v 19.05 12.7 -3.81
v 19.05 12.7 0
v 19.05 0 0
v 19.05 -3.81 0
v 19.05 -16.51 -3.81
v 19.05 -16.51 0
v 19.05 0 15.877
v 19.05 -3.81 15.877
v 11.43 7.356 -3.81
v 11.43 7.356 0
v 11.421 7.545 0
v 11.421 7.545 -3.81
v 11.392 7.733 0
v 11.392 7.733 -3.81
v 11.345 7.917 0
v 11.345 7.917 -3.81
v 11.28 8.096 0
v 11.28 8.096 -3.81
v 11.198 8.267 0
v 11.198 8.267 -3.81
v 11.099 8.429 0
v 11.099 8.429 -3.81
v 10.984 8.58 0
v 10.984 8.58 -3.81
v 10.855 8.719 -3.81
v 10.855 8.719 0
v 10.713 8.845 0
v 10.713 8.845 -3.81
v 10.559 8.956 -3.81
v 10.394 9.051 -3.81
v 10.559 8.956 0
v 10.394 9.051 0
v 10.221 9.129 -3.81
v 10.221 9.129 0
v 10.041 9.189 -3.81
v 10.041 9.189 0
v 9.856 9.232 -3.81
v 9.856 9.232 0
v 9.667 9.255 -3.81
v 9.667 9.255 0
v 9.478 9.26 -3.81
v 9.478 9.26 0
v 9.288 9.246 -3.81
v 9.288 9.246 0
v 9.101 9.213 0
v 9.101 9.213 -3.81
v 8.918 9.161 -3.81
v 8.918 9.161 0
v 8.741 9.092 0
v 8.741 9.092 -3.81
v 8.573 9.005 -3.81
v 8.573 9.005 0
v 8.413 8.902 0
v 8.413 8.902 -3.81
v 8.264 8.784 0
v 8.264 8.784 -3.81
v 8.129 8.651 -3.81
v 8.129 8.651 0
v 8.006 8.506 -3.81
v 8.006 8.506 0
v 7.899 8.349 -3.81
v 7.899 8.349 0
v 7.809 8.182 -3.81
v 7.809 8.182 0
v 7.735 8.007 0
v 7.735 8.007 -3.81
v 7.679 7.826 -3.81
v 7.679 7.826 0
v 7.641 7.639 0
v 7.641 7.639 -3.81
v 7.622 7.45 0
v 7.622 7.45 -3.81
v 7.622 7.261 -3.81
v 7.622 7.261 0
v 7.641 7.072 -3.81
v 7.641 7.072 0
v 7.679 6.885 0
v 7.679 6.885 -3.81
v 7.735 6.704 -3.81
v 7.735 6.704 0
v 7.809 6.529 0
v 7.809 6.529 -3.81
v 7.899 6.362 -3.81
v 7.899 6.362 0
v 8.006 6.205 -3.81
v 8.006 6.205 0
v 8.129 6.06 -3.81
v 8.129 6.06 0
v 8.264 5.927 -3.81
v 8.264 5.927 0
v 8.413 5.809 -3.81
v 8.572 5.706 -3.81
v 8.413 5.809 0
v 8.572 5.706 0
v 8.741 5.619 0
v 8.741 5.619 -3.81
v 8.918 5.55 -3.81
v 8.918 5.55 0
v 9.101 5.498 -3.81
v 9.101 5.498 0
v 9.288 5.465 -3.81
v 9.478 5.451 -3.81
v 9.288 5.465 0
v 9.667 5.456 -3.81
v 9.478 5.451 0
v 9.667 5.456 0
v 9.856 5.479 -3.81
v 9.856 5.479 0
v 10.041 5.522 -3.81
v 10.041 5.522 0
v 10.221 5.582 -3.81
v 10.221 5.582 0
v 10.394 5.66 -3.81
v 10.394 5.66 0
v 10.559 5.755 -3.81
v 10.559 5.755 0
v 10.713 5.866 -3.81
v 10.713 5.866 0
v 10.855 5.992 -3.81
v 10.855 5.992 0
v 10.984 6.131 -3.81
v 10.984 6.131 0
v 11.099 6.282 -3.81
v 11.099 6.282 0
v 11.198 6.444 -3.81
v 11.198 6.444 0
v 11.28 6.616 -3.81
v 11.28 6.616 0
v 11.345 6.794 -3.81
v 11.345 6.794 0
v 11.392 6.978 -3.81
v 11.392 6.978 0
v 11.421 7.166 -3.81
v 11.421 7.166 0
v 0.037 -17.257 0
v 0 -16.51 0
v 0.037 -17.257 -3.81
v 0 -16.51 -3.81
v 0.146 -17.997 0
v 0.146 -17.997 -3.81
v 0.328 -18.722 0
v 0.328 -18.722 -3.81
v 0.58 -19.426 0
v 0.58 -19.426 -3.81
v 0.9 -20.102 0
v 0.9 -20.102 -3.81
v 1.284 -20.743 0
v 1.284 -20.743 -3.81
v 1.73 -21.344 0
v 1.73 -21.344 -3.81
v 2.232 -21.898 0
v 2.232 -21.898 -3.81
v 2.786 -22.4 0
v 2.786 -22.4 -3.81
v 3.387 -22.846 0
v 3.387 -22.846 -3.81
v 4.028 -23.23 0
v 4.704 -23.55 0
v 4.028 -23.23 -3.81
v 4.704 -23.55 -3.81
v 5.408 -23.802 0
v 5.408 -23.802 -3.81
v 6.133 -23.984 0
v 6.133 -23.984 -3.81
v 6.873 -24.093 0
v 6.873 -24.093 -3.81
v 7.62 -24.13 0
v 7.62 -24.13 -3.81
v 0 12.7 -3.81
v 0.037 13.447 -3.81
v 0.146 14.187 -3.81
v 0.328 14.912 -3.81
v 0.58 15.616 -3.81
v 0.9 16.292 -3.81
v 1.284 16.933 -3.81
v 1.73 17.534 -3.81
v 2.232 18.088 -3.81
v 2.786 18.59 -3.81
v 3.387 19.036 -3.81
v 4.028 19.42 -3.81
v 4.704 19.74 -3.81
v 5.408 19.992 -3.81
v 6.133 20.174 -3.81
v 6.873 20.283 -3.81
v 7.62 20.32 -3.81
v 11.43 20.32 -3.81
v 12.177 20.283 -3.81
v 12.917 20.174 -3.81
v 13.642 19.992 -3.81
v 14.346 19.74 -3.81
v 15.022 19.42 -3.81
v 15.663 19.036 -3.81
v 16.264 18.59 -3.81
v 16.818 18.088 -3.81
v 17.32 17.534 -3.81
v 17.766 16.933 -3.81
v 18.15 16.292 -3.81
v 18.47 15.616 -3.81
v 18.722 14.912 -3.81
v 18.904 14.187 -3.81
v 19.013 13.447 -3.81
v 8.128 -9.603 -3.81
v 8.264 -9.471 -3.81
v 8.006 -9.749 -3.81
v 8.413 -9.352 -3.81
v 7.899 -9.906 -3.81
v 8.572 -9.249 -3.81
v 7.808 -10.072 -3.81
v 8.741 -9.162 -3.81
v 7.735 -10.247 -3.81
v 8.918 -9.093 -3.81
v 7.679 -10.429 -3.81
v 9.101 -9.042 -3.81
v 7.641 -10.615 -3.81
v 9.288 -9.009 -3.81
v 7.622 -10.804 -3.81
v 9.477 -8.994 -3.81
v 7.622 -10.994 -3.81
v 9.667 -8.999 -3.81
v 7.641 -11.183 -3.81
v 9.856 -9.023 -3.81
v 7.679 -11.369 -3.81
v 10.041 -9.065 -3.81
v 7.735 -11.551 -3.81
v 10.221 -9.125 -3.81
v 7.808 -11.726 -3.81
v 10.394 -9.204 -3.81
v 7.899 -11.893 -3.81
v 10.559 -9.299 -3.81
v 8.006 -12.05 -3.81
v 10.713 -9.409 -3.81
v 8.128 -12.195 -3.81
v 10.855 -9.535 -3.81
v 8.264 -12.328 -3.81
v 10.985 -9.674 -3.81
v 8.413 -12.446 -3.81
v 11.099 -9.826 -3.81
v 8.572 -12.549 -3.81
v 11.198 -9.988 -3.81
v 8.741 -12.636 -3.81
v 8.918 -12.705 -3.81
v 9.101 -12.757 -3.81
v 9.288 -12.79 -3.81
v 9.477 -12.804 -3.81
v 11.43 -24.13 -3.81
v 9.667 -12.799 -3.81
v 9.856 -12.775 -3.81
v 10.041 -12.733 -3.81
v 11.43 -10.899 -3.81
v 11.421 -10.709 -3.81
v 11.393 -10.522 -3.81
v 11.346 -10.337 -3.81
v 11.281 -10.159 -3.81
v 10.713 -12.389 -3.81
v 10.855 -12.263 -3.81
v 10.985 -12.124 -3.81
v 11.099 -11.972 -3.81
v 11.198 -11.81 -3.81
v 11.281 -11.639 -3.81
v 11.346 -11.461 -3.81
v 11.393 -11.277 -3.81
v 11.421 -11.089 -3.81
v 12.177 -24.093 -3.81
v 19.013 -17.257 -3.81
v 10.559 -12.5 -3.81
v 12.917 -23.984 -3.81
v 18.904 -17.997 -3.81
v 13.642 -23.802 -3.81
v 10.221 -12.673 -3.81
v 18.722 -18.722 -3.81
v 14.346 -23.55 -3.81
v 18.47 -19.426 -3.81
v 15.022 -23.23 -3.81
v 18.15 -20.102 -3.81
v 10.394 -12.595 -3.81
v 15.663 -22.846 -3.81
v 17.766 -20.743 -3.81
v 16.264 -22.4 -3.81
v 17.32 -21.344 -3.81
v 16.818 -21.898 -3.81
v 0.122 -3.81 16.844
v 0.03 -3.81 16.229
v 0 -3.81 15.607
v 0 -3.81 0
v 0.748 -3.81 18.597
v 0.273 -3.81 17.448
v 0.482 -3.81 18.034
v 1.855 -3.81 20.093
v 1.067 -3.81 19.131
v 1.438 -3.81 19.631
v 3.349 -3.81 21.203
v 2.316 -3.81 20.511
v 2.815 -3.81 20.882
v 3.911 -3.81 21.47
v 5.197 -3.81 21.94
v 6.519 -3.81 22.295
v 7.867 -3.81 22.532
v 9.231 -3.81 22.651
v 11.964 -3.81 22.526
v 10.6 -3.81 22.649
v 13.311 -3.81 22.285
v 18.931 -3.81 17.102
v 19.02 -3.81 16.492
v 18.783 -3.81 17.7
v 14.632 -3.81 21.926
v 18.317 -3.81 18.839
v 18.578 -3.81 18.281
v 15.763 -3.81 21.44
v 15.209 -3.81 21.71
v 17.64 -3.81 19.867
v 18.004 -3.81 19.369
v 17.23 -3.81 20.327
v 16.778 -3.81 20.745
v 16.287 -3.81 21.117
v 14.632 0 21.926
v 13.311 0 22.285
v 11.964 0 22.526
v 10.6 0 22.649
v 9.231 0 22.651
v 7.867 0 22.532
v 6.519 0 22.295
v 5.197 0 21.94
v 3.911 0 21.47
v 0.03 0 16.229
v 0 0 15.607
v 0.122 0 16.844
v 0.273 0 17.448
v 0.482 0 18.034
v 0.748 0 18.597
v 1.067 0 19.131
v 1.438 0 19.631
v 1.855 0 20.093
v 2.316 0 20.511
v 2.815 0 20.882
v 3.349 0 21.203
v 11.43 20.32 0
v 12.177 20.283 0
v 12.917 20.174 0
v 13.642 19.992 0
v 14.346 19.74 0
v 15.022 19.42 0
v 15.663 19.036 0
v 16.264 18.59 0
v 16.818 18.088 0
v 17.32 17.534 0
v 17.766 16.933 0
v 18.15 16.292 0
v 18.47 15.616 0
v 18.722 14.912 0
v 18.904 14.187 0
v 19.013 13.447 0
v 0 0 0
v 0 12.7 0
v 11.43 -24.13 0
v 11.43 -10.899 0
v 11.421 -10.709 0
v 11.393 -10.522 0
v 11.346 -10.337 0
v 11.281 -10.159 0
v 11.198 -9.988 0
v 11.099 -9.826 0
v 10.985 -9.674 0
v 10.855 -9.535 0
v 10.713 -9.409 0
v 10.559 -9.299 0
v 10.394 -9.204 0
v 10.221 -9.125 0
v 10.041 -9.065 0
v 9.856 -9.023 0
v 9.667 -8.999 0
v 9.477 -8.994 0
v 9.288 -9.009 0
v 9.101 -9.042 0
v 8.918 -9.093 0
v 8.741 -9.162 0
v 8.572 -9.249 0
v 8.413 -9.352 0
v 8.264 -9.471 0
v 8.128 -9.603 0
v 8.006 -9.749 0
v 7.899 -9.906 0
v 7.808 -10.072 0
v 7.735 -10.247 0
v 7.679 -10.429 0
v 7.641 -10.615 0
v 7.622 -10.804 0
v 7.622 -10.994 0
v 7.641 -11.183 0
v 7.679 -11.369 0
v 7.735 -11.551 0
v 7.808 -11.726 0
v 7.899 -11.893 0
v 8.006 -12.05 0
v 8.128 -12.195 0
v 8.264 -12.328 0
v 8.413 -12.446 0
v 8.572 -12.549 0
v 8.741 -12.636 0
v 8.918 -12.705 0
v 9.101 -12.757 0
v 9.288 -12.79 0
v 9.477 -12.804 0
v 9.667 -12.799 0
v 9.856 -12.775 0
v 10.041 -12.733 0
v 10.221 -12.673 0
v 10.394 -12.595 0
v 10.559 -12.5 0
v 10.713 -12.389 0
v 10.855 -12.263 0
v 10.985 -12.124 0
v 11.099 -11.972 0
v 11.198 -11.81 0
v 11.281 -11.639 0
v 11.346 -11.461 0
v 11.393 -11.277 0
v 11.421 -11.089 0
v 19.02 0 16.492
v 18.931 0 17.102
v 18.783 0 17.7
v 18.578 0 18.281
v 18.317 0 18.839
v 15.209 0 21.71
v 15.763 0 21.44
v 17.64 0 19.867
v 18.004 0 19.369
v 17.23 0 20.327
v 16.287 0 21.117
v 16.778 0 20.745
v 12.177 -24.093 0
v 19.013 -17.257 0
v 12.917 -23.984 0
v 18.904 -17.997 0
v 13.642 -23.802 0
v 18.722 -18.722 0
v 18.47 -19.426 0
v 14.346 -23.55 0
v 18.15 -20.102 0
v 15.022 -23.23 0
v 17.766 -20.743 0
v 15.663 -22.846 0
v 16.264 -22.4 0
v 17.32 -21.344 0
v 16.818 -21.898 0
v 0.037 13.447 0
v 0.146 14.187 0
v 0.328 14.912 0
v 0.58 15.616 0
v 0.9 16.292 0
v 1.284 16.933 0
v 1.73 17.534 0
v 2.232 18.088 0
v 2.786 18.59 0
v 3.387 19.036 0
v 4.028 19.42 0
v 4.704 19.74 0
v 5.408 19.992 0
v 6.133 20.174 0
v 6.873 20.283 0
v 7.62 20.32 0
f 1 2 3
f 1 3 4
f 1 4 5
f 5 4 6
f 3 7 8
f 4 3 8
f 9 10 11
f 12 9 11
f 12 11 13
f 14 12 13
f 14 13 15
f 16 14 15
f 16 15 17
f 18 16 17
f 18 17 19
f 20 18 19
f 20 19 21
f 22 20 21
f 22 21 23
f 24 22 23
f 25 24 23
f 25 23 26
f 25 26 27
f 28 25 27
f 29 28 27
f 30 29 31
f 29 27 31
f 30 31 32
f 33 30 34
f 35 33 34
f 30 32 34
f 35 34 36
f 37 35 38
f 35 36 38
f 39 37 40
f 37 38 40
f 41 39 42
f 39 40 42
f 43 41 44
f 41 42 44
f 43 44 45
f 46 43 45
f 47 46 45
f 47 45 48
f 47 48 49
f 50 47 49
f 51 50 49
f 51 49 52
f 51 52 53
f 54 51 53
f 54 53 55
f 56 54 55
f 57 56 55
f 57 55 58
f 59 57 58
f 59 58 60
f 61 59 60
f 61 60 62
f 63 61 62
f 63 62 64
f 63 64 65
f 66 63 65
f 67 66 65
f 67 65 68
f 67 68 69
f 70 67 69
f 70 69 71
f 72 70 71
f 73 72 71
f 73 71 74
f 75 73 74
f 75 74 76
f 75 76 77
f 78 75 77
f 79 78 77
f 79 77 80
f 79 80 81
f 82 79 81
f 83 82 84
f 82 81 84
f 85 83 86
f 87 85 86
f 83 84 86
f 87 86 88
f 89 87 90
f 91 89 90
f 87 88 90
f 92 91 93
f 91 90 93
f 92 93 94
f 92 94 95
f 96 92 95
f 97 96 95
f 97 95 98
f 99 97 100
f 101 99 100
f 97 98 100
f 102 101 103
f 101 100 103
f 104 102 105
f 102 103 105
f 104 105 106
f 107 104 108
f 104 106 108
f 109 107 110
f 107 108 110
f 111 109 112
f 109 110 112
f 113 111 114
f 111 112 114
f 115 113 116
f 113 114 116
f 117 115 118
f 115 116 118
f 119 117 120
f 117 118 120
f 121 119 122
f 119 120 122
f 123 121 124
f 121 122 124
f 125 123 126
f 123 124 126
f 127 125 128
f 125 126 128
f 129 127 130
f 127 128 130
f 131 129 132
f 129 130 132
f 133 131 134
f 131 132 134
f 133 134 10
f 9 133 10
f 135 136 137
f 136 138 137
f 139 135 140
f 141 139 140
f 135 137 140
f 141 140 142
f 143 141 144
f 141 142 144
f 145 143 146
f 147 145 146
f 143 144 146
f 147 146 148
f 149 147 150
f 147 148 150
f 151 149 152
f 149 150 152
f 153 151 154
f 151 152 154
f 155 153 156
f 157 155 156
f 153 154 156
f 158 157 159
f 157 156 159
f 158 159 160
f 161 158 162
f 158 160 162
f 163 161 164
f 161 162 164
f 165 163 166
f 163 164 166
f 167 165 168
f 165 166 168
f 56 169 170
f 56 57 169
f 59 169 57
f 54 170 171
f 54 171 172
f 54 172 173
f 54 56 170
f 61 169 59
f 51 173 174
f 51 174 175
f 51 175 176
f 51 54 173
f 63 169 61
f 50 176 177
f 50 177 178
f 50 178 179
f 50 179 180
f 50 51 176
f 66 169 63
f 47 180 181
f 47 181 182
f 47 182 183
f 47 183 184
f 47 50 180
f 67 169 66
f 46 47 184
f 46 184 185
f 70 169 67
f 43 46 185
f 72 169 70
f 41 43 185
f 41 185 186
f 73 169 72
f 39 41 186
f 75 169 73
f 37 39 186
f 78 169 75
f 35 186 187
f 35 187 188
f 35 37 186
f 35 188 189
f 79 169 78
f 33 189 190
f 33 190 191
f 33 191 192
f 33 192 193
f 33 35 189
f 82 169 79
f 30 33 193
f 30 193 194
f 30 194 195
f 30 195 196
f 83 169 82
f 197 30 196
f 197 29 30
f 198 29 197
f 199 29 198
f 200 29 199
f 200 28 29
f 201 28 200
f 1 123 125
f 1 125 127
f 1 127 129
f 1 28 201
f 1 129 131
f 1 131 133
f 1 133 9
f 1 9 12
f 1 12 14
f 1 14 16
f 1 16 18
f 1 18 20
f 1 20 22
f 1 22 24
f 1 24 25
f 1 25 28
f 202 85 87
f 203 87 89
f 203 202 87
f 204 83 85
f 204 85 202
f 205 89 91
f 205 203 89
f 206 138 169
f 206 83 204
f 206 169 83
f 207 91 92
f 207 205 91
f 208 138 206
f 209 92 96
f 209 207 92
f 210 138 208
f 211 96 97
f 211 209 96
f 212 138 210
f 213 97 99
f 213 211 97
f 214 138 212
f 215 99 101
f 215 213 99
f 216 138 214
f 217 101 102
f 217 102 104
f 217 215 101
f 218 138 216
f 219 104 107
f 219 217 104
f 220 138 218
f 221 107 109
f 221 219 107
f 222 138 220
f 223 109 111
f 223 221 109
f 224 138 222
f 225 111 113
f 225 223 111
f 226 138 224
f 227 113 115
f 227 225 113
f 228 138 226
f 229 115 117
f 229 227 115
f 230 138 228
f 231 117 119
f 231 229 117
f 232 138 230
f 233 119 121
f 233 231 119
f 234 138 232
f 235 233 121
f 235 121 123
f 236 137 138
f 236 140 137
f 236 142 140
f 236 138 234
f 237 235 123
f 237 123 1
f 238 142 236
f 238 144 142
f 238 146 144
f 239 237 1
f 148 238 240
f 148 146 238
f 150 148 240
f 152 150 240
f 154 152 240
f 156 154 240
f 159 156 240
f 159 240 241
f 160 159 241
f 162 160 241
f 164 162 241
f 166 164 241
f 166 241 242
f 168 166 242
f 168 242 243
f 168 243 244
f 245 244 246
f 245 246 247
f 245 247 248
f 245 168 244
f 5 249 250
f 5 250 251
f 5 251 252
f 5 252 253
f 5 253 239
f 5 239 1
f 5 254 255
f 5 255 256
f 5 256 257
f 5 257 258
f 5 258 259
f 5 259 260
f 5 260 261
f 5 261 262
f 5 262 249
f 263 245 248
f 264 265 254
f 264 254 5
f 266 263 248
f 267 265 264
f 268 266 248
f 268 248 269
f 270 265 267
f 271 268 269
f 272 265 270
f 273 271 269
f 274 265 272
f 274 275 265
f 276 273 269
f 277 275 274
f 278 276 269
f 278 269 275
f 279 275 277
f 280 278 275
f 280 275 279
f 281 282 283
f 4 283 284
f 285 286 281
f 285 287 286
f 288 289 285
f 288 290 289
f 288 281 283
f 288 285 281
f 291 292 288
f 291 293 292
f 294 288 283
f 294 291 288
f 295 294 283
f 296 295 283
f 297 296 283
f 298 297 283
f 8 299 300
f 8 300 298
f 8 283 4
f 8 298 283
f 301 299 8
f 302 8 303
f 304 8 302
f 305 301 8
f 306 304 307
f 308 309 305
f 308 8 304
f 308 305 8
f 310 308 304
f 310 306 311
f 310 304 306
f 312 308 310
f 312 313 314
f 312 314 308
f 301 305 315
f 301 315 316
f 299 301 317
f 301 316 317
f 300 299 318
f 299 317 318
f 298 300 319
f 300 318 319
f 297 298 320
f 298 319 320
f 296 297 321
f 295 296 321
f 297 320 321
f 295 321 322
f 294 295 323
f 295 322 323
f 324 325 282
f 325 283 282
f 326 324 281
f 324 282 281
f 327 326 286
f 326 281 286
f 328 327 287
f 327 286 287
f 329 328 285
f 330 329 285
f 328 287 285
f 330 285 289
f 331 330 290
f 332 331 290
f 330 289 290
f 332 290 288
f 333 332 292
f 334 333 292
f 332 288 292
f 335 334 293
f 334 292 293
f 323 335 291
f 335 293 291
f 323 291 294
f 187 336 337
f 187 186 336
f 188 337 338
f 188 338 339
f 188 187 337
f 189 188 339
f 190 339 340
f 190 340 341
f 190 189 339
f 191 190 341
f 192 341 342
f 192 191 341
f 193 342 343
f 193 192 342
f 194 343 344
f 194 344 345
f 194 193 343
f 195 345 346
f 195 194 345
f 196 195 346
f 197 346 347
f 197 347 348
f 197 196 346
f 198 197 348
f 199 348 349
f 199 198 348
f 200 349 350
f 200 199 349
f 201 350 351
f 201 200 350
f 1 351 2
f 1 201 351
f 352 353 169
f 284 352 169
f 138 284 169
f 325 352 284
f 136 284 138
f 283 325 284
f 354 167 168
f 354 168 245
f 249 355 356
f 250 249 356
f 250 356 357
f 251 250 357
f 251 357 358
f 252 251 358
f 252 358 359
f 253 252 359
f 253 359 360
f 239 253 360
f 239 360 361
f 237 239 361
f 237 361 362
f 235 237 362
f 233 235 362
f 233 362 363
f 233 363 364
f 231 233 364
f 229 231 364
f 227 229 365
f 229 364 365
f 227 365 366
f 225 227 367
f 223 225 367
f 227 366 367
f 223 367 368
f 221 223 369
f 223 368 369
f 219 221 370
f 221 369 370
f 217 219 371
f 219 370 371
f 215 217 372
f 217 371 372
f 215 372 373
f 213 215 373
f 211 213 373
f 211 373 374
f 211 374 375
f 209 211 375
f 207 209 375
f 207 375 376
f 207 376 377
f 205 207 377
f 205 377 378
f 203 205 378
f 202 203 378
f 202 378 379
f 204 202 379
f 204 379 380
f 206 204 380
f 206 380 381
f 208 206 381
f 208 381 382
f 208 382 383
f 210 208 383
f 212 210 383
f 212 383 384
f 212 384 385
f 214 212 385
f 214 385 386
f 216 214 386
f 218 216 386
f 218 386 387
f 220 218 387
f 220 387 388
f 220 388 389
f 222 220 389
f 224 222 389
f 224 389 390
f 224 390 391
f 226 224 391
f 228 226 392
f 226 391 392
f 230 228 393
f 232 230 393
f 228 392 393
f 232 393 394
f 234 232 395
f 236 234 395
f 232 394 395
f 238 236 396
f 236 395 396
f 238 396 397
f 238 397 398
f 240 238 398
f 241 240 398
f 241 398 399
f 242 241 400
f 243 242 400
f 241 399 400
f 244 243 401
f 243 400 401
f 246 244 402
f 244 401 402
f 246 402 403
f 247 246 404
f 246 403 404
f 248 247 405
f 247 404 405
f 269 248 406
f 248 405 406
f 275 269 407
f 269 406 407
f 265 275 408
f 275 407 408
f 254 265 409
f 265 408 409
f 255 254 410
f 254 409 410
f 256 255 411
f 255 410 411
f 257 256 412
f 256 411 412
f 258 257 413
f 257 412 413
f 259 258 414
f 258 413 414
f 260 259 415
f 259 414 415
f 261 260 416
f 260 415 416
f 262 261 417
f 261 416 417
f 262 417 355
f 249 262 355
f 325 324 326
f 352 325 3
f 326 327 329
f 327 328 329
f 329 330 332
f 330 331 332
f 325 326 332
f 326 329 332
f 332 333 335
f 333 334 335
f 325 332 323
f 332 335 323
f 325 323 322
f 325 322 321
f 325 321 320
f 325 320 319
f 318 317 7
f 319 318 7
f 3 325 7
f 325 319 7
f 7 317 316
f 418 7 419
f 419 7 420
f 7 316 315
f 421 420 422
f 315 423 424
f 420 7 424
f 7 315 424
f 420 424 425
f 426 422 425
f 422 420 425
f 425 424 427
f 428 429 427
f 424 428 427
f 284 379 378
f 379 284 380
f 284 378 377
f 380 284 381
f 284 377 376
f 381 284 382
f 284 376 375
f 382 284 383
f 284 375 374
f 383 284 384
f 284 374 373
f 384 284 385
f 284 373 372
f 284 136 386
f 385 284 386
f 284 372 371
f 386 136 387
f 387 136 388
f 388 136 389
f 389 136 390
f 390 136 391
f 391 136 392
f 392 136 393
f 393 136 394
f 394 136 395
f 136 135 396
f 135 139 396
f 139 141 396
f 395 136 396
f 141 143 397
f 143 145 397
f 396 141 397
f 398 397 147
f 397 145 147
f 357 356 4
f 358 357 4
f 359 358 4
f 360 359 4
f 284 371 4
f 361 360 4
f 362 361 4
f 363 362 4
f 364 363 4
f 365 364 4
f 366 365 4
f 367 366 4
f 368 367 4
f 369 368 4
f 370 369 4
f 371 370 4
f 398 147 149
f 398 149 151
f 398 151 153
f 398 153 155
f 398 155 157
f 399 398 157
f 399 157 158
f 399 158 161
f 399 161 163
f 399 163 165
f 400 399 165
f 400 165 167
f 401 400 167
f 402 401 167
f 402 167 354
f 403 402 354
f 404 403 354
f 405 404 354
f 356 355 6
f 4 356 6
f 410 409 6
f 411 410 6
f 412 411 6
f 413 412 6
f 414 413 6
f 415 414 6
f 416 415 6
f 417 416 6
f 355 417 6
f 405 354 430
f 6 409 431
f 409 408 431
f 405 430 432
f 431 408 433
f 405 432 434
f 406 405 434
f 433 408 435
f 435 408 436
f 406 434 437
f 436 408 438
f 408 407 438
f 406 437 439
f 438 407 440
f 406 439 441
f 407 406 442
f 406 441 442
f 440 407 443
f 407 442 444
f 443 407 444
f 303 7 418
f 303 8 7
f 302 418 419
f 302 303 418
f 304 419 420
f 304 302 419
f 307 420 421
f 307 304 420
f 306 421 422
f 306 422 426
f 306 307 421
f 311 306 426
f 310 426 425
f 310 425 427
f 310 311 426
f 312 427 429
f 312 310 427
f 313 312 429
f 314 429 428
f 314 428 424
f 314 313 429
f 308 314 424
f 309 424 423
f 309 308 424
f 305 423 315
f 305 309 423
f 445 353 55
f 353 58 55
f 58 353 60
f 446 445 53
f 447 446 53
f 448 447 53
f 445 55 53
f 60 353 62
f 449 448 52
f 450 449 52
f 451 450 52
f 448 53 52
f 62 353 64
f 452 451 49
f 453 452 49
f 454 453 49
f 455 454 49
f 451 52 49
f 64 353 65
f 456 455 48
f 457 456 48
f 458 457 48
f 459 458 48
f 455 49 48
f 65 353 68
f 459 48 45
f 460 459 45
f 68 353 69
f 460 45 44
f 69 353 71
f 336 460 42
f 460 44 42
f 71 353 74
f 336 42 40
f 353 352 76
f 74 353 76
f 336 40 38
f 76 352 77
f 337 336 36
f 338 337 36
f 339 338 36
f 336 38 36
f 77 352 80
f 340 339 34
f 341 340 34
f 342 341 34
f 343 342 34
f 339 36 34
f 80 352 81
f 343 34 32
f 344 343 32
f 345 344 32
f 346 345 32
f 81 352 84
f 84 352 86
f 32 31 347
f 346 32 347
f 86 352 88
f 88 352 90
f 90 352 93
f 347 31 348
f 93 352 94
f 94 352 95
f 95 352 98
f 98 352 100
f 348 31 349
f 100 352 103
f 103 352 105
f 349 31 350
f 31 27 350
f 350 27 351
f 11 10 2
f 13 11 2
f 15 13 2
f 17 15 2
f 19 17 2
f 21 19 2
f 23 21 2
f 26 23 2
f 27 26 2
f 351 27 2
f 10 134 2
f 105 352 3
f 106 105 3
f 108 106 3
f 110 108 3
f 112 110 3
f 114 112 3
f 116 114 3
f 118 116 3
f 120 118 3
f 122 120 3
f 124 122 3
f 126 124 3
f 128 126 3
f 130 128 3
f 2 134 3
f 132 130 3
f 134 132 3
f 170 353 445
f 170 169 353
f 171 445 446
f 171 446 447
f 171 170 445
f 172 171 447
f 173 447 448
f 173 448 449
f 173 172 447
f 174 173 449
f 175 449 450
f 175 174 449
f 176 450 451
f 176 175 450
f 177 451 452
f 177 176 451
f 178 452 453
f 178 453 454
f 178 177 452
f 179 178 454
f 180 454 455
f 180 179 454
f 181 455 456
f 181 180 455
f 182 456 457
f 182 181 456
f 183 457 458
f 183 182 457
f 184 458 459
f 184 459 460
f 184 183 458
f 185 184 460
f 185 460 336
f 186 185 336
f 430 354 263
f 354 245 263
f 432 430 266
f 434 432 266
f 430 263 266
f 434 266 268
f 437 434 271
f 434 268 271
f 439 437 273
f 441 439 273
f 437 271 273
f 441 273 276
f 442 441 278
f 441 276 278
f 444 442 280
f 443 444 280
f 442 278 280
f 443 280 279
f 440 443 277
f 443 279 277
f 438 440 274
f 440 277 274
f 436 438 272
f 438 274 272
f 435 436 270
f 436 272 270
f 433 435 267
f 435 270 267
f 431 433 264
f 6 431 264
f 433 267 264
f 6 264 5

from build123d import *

# Parameters (mm, degrees)
F1_DEPTH = 3.81
F2_R     = 6.35
F3_W     = 19.05
F3_H     = 44.45
F4_DEPTH = 3.81
F5_R     = 7.62
F6_R     = 1.905
F6_R_2   = 1.9053216062
F7_DEPTH = 25.4


# Not quite as in the source:
# - a feature names something its author has since deleted; it is built from what else it names


with BuildPart() as f1:
    # F0 (on Front) → F1 (new body)
    with BuildSketch(Plane.XZ):
        with BuildLine():
            Line((0, 19.1190056503), (0, 0))
            Line((0, 0), (19.05, 0))
            Line((19.05, 0), (19.05, 19.6883492172))
            ThreePointArc((19.05, 19.6883492172), (9.4277487791, 22.6576630171), (0, 19.1190056503))
        make_face()
    extrude(amount=F1_DEPTH)

    # F2
    f2_edges = [f1.edges().sort_by_distance(p)[0] for p in [
        (0, -1.905, 19.119006),
        (19.05, -1.905, 19.688349),
    ]]
    fillet(f2_edges, radius=F2_R)

    # F3 (on face) → F4 (join)
    with BuildSketch(Plane(origin=(0, 0, 0), x_dir=(1, 0, 0), z_dir=(0, 0, -1))):
        with Locations((9.525, 1.905)):
            Rectangle(F3_W, F3_H)
    extrude(amount=F4_DEPTH)

    # F5
    f5_edges = [f1.edges().sort_by_distance(p)[0] for p in [
        (19.05, -24.13, -1.905),
        (0, -24.13, -1.905),
        (19.05, 20.32, -1.905),
        (0, 20.32, -1.905),
    ]]
    fillet(f5_edges, radius=F5_R)

    # F6 (on face) → F7 (cut)
    with BuildSketch(Plane.XY):
        with Locations((9.525, 7.3555377312)):
            Circle(F6_R)
        with Locations((9.525, -10.8990902081)):
            Circle(F6_R_2)
    extrude(amount=-F7_DEPTH, mode=Mode.SUBTRACT)


solid = f1.part
